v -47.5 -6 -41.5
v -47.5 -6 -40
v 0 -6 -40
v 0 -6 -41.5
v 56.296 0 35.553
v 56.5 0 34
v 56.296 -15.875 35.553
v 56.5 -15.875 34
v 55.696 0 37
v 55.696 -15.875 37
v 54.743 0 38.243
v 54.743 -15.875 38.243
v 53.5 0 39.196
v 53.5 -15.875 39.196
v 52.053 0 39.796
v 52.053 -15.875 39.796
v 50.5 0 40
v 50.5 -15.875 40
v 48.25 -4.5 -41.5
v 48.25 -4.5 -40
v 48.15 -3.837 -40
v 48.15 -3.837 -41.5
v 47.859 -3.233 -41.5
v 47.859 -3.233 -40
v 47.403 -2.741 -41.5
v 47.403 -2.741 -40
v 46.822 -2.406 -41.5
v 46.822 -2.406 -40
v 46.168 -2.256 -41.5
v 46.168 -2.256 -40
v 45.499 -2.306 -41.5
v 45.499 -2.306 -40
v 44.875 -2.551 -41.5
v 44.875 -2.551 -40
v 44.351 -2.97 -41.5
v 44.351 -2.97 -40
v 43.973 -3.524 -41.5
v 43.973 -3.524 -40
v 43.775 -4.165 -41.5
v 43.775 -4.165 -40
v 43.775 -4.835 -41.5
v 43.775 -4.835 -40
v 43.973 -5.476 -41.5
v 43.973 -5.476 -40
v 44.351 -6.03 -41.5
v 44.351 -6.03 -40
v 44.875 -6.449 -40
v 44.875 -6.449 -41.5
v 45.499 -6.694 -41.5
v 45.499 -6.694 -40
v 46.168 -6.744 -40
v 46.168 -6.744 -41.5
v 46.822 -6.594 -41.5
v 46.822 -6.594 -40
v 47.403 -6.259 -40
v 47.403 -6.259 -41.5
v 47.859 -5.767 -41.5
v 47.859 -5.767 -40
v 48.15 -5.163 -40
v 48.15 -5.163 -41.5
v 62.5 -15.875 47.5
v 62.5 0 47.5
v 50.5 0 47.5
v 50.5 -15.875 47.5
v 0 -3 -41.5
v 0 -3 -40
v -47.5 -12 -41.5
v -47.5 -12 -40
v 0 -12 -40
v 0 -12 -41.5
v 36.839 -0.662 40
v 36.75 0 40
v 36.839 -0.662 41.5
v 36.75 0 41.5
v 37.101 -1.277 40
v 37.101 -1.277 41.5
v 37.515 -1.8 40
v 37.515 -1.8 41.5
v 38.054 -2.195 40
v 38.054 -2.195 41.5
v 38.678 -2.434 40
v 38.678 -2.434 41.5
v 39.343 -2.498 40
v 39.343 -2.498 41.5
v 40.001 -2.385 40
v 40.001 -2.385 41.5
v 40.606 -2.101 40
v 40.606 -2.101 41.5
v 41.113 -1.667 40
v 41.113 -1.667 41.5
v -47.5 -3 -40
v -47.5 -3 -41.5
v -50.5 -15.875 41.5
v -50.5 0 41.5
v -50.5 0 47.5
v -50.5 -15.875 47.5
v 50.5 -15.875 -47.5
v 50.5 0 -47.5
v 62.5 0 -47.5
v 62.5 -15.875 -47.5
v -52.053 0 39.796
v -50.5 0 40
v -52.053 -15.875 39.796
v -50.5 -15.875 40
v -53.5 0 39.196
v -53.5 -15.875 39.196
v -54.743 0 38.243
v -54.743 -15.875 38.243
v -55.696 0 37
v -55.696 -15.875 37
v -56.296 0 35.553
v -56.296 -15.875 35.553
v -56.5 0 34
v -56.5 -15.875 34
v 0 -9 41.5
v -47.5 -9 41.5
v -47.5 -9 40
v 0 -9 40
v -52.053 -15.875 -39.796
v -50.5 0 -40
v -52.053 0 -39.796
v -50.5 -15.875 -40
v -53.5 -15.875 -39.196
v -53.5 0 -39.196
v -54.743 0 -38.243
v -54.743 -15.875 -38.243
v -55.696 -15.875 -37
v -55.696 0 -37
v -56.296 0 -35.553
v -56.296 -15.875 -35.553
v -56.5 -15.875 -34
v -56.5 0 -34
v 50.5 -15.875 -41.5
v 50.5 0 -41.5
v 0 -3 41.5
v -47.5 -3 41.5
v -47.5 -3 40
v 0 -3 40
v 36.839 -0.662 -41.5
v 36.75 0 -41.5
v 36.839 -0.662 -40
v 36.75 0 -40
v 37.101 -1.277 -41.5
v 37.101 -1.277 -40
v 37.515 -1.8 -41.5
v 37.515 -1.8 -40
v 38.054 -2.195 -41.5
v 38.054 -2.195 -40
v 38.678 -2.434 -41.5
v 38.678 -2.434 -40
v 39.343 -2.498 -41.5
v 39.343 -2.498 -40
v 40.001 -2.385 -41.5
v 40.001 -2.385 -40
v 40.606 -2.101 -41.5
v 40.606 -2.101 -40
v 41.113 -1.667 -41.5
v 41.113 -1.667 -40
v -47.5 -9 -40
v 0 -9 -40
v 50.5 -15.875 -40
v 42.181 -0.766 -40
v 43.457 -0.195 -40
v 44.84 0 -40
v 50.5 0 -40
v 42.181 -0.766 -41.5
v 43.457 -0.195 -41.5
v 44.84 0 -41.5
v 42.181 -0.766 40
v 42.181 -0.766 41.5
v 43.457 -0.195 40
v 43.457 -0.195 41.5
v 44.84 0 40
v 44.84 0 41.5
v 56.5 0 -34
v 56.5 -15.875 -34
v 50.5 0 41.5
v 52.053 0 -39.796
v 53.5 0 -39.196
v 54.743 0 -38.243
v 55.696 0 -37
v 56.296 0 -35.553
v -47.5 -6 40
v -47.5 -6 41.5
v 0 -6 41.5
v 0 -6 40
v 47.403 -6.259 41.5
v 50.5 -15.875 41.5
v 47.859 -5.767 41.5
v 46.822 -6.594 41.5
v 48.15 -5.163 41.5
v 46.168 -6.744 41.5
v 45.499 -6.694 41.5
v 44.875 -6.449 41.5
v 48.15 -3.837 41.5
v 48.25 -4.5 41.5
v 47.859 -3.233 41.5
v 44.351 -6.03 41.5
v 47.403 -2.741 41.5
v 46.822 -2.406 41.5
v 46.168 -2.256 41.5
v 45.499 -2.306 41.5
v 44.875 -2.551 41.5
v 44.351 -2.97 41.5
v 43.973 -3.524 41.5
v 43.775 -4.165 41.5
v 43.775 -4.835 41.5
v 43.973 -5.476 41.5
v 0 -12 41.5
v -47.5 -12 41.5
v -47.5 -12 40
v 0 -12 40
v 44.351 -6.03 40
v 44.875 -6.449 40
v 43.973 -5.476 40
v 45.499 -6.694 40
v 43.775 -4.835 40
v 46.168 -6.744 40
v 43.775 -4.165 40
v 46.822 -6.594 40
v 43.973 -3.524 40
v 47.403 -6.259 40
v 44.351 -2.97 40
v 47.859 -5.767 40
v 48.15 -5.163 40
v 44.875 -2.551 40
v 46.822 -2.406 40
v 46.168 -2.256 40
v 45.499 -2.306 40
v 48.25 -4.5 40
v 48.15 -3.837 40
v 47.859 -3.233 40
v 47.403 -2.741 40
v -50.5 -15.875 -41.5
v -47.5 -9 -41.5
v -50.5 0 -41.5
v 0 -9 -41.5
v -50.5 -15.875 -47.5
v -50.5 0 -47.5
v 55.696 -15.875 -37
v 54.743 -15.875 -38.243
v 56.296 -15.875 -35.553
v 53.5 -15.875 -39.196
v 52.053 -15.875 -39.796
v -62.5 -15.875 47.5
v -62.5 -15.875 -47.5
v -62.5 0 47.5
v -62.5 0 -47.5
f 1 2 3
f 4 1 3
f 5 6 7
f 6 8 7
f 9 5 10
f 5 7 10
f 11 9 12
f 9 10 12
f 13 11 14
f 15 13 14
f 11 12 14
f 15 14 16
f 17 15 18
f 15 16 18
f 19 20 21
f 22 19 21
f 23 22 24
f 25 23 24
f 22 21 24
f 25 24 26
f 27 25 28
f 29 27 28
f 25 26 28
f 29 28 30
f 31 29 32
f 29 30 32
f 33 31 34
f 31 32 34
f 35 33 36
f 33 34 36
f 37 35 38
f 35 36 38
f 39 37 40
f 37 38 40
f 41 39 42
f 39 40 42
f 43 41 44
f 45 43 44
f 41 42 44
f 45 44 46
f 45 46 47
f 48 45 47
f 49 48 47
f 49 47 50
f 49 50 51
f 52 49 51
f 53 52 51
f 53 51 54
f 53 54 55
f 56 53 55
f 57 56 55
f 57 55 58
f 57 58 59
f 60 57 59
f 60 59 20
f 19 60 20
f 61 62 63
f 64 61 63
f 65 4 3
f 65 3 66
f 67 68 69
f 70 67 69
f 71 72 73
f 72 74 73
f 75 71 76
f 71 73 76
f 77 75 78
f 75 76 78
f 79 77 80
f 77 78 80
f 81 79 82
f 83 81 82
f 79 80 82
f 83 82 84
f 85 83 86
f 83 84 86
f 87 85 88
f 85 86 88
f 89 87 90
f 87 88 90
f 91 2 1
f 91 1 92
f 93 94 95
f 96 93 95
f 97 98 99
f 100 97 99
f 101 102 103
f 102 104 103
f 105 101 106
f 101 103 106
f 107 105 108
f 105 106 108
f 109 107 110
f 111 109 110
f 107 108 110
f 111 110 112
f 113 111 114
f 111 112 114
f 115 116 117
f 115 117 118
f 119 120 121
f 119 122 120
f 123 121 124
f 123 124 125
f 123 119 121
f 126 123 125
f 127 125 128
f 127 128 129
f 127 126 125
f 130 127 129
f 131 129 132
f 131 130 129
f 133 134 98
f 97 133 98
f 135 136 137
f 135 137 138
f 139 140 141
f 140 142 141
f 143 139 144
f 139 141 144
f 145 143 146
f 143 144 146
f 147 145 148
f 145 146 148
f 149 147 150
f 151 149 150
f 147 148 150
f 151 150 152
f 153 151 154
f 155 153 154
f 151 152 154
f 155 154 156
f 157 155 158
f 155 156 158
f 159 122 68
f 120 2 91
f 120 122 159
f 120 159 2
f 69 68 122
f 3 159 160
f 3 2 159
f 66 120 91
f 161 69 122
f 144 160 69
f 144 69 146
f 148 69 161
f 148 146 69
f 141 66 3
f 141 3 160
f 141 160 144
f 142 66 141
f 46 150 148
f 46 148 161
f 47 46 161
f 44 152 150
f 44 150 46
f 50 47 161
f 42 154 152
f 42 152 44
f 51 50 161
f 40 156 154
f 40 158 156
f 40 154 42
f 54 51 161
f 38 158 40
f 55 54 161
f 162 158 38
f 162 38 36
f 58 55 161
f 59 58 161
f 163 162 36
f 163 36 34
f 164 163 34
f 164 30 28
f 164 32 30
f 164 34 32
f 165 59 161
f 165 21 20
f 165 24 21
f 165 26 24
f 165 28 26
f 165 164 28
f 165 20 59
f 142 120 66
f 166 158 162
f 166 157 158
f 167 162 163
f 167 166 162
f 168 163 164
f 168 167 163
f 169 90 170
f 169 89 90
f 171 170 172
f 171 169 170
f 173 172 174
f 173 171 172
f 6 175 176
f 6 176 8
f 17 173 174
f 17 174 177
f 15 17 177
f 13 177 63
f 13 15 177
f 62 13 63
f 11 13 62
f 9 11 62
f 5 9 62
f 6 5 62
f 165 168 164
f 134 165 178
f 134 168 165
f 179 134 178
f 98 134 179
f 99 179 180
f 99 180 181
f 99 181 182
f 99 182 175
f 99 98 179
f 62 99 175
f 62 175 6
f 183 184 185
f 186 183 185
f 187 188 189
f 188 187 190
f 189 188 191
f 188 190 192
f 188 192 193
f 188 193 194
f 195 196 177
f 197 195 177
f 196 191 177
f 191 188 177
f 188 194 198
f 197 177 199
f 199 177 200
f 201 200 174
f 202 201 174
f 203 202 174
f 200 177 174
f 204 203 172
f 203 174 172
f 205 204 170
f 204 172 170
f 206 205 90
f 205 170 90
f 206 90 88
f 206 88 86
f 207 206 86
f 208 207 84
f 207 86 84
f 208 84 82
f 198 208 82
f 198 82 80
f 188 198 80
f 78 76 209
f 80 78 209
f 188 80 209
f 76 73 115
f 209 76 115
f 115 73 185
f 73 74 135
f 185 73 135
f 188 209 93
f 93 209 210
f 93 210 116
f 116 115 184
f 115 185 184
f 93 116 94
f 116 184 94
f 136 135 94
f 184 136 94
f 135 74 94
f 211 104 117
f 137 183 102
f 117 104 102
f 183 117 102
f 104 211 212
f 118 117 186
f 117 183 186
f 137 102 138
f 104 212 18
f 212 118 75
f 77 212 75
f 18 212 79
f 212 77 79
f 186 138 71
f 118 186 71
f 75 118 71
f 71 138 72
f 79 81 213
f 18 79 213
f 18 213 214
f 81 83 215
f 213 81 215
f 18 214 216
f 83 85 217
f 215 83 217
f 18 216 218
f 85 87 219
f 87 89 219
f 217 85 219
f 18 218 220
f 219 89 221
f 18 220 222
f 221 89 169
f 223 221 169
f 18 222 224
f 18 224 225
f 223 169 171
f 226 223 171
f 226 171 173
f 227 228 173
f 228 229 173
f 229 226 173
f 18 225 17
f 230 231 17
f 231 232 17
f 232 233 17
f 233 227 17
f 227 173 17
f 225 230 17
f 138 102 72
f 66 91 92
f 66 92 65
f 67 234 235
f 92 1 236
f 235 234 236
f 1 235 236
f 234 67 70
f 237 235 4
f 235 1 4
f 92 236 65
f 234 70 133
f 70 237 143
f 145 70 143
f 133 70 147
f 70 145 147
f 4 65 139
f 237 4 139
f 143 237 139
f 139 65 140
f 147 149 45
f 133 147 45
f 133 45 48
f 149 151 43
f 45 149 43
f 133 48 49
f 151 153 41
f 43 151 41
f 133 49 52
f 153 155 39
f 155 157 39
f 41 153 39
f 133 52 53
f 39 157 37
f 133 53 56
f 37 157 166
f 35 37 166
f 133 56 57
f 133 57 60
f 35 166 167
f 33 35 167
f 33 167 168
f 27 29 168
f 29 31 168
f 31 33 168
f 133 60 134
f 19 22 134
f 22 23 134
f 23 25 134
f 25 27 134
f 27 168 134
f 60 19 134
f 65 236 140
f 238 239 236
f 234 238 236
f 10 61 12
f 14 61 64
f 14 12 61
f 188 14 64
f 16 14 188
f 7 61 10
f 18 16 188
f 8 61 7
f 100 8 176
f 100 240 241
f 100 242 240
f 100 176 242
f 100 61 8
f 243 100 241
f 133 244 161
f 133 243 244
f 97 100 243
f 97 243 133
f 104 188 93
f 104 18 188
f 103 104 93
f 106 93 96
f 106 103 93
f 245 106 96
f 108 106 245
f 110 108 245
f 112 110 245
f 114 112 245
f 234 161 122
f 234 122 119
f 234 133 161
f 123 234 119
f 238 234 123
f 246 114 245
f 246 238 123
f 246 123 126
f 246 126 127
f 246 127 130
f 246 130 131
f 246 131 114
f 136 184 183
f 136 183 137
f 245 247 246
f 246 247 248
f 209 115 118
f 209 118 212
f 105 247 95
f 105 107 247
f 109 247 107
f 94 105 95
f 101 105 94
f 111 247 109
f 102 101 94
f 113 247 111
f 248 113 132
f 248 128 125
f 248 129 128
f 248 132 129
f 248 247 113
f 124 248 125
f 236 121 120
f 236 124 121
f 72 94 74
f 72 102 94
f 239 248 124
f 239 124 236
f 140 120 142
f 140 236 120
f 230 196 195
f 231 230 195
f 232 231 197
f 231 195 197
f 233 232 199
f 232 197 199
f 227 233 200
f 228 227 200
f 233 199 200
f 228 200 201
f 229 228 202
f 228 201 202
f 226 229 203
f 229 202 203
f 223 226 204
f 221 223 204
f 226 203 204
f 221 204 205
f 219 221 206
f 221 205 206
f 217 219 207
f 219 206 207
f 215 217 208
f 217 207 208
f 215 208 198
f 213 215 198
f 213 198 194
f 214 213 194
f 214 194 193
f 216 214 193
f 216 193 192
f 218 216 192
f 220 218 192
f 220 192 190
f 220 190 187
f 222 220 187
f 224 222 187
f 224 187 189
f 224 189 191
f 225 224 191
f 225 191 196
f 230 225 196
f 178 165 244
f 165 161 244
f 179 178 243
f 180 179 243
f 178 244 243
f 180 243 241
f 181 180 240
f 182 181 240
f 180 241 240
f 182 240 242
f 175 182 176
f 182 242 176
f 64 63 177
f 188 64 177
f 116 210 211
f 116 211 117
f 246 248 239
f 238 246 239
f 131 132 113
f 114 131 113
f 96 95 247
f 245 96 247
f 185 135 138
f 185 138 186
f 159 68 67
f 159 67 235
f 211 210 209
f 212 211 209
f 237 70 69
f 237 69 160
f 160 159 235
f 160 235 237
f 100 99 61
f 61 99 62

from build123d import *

# Parameters (mm, degrees)
F0_W      = 113
F0_H      = 80
F1_DEPTH  = 15.875
F2_R      = 6
F3_W      = 89
F3_H      = 3
F3_W_2    = 95
F3_R      = 1.5
F4_DEPTH  = 132
F5_W      = 42.9403819144
F5_H      = 7.4070980772
F6_DEPTH  = 1.5
F7_W      = 42.8083911538
F7_H      = 7.2430414148
F8_DEPTH  = 1.5
F9_R      = 2.5
F10_DEPTH = 92
F11_R     = 2.25
F12_DEPTH = 200
F13_R     = 5


with BuildPart() as f1:
    # F0 (on Front) → F1 (new body)
    with BuildSketch(Plane.XZ):
        Polygon((-50.5, 47.5), (-62.5, 47.5), (-62.5, -47.5), (-50.5, -47.5), (-50.5, -41.5), (50.5, -41.5), (50.5, -47.5), (62.5, -47.5), (62.5, 47.5), (50.5, 47.5), (50.5, 41.5), (-50.5, 41.5), align=None)
        Rectangle(F0_W, F0_H, mode=Mode.SUBTRACT)
    extrude(amount=F1_DEPTH)

    # F2
    f2_edges = [f1.edges().sort_by_distance(p)[0] for p in [
        (56.5, -7.9375, 40),
        (56.5, -7.9375, -40),
        (-56.5, -7.9375, -40),
        (-56.5, -7.9375, 40),
    ]]
    fillet(f2_edges, radius=F2_R)

    # F3 (on face) → F4 (cut)
    with BuildSketch(Plane.XY.offset(41.5)):
        with Locations((-3, -4.5)):
            Rectangle(F3_W, F3_H)
        with Locations((0, -10.5)):
            Rectangle(F3_W_2, F3_H)
        with Locations((46, -4.5)):
            Circle(F3_R)
    extrude(amount=-F4_DEPTH, mode=Mode.SUBTRACT)

    # F5 (on face) → F6 (join)
    with BuildSketch(Plane.XY.offset(41.5)):
        with Locations((21.4701909572, -3.7035490386)):
            Rectangle(F5_W, F5_H)
        Polygon((42.9403819144, -7.4070980772), (0, -7.4070980772), (0, -14.1382440925), (49.1435937583, -14.1382440925), (49.1435937583, -7.4070980772), align=None)
    extrude(amount=-F6_DEPTH)

    # F7 (on face) → F8 (join)
    with BuildSketch(Plane(origin=(0, 0, -41.5), x_dir=(1, 0, 0), z_dir=(0, 0, -1))):
        Polygon((49.0116067231, 15.875), (0, 15.875), (0, 7.2430414148), (42.8083911538, 7.2430414148), (49.0116067231, 7.2430414148), align=None)
        with Locations((21.4041955769, 3.6215207074)):
            Rectangle(F7_W, F7_H)
    extrude(amount=-F8_DEPTH)

    # F9 (on face) → F10 (cut)
    with BuildSketch(Plane.XY.offset(41.5)):
        with Locations((39.25, 0)):
            Circle(F9_R)
    extrude(amount=-F10_DEPTH, mode=Mode.SUBTRACT)

    # F11 (on face) → F12 (cut)
    with BuildSketch(Plane.XY.offset(41.5)):
        with Locations((46, -4.5)):
            Circle(F11_R)
    extrude(amount=-F12_DEPTH, mode=Mode.SUBTRACT)

    # F13
    f13_edges = [f1.edges().sort_by_distance(p)[0] for p in [
        (41.75, 0, 40.75),
        (41.75, 0, -40.75),
    ]]
    fillet(f13_edges, radius=F13_R)


solid = f1.part
